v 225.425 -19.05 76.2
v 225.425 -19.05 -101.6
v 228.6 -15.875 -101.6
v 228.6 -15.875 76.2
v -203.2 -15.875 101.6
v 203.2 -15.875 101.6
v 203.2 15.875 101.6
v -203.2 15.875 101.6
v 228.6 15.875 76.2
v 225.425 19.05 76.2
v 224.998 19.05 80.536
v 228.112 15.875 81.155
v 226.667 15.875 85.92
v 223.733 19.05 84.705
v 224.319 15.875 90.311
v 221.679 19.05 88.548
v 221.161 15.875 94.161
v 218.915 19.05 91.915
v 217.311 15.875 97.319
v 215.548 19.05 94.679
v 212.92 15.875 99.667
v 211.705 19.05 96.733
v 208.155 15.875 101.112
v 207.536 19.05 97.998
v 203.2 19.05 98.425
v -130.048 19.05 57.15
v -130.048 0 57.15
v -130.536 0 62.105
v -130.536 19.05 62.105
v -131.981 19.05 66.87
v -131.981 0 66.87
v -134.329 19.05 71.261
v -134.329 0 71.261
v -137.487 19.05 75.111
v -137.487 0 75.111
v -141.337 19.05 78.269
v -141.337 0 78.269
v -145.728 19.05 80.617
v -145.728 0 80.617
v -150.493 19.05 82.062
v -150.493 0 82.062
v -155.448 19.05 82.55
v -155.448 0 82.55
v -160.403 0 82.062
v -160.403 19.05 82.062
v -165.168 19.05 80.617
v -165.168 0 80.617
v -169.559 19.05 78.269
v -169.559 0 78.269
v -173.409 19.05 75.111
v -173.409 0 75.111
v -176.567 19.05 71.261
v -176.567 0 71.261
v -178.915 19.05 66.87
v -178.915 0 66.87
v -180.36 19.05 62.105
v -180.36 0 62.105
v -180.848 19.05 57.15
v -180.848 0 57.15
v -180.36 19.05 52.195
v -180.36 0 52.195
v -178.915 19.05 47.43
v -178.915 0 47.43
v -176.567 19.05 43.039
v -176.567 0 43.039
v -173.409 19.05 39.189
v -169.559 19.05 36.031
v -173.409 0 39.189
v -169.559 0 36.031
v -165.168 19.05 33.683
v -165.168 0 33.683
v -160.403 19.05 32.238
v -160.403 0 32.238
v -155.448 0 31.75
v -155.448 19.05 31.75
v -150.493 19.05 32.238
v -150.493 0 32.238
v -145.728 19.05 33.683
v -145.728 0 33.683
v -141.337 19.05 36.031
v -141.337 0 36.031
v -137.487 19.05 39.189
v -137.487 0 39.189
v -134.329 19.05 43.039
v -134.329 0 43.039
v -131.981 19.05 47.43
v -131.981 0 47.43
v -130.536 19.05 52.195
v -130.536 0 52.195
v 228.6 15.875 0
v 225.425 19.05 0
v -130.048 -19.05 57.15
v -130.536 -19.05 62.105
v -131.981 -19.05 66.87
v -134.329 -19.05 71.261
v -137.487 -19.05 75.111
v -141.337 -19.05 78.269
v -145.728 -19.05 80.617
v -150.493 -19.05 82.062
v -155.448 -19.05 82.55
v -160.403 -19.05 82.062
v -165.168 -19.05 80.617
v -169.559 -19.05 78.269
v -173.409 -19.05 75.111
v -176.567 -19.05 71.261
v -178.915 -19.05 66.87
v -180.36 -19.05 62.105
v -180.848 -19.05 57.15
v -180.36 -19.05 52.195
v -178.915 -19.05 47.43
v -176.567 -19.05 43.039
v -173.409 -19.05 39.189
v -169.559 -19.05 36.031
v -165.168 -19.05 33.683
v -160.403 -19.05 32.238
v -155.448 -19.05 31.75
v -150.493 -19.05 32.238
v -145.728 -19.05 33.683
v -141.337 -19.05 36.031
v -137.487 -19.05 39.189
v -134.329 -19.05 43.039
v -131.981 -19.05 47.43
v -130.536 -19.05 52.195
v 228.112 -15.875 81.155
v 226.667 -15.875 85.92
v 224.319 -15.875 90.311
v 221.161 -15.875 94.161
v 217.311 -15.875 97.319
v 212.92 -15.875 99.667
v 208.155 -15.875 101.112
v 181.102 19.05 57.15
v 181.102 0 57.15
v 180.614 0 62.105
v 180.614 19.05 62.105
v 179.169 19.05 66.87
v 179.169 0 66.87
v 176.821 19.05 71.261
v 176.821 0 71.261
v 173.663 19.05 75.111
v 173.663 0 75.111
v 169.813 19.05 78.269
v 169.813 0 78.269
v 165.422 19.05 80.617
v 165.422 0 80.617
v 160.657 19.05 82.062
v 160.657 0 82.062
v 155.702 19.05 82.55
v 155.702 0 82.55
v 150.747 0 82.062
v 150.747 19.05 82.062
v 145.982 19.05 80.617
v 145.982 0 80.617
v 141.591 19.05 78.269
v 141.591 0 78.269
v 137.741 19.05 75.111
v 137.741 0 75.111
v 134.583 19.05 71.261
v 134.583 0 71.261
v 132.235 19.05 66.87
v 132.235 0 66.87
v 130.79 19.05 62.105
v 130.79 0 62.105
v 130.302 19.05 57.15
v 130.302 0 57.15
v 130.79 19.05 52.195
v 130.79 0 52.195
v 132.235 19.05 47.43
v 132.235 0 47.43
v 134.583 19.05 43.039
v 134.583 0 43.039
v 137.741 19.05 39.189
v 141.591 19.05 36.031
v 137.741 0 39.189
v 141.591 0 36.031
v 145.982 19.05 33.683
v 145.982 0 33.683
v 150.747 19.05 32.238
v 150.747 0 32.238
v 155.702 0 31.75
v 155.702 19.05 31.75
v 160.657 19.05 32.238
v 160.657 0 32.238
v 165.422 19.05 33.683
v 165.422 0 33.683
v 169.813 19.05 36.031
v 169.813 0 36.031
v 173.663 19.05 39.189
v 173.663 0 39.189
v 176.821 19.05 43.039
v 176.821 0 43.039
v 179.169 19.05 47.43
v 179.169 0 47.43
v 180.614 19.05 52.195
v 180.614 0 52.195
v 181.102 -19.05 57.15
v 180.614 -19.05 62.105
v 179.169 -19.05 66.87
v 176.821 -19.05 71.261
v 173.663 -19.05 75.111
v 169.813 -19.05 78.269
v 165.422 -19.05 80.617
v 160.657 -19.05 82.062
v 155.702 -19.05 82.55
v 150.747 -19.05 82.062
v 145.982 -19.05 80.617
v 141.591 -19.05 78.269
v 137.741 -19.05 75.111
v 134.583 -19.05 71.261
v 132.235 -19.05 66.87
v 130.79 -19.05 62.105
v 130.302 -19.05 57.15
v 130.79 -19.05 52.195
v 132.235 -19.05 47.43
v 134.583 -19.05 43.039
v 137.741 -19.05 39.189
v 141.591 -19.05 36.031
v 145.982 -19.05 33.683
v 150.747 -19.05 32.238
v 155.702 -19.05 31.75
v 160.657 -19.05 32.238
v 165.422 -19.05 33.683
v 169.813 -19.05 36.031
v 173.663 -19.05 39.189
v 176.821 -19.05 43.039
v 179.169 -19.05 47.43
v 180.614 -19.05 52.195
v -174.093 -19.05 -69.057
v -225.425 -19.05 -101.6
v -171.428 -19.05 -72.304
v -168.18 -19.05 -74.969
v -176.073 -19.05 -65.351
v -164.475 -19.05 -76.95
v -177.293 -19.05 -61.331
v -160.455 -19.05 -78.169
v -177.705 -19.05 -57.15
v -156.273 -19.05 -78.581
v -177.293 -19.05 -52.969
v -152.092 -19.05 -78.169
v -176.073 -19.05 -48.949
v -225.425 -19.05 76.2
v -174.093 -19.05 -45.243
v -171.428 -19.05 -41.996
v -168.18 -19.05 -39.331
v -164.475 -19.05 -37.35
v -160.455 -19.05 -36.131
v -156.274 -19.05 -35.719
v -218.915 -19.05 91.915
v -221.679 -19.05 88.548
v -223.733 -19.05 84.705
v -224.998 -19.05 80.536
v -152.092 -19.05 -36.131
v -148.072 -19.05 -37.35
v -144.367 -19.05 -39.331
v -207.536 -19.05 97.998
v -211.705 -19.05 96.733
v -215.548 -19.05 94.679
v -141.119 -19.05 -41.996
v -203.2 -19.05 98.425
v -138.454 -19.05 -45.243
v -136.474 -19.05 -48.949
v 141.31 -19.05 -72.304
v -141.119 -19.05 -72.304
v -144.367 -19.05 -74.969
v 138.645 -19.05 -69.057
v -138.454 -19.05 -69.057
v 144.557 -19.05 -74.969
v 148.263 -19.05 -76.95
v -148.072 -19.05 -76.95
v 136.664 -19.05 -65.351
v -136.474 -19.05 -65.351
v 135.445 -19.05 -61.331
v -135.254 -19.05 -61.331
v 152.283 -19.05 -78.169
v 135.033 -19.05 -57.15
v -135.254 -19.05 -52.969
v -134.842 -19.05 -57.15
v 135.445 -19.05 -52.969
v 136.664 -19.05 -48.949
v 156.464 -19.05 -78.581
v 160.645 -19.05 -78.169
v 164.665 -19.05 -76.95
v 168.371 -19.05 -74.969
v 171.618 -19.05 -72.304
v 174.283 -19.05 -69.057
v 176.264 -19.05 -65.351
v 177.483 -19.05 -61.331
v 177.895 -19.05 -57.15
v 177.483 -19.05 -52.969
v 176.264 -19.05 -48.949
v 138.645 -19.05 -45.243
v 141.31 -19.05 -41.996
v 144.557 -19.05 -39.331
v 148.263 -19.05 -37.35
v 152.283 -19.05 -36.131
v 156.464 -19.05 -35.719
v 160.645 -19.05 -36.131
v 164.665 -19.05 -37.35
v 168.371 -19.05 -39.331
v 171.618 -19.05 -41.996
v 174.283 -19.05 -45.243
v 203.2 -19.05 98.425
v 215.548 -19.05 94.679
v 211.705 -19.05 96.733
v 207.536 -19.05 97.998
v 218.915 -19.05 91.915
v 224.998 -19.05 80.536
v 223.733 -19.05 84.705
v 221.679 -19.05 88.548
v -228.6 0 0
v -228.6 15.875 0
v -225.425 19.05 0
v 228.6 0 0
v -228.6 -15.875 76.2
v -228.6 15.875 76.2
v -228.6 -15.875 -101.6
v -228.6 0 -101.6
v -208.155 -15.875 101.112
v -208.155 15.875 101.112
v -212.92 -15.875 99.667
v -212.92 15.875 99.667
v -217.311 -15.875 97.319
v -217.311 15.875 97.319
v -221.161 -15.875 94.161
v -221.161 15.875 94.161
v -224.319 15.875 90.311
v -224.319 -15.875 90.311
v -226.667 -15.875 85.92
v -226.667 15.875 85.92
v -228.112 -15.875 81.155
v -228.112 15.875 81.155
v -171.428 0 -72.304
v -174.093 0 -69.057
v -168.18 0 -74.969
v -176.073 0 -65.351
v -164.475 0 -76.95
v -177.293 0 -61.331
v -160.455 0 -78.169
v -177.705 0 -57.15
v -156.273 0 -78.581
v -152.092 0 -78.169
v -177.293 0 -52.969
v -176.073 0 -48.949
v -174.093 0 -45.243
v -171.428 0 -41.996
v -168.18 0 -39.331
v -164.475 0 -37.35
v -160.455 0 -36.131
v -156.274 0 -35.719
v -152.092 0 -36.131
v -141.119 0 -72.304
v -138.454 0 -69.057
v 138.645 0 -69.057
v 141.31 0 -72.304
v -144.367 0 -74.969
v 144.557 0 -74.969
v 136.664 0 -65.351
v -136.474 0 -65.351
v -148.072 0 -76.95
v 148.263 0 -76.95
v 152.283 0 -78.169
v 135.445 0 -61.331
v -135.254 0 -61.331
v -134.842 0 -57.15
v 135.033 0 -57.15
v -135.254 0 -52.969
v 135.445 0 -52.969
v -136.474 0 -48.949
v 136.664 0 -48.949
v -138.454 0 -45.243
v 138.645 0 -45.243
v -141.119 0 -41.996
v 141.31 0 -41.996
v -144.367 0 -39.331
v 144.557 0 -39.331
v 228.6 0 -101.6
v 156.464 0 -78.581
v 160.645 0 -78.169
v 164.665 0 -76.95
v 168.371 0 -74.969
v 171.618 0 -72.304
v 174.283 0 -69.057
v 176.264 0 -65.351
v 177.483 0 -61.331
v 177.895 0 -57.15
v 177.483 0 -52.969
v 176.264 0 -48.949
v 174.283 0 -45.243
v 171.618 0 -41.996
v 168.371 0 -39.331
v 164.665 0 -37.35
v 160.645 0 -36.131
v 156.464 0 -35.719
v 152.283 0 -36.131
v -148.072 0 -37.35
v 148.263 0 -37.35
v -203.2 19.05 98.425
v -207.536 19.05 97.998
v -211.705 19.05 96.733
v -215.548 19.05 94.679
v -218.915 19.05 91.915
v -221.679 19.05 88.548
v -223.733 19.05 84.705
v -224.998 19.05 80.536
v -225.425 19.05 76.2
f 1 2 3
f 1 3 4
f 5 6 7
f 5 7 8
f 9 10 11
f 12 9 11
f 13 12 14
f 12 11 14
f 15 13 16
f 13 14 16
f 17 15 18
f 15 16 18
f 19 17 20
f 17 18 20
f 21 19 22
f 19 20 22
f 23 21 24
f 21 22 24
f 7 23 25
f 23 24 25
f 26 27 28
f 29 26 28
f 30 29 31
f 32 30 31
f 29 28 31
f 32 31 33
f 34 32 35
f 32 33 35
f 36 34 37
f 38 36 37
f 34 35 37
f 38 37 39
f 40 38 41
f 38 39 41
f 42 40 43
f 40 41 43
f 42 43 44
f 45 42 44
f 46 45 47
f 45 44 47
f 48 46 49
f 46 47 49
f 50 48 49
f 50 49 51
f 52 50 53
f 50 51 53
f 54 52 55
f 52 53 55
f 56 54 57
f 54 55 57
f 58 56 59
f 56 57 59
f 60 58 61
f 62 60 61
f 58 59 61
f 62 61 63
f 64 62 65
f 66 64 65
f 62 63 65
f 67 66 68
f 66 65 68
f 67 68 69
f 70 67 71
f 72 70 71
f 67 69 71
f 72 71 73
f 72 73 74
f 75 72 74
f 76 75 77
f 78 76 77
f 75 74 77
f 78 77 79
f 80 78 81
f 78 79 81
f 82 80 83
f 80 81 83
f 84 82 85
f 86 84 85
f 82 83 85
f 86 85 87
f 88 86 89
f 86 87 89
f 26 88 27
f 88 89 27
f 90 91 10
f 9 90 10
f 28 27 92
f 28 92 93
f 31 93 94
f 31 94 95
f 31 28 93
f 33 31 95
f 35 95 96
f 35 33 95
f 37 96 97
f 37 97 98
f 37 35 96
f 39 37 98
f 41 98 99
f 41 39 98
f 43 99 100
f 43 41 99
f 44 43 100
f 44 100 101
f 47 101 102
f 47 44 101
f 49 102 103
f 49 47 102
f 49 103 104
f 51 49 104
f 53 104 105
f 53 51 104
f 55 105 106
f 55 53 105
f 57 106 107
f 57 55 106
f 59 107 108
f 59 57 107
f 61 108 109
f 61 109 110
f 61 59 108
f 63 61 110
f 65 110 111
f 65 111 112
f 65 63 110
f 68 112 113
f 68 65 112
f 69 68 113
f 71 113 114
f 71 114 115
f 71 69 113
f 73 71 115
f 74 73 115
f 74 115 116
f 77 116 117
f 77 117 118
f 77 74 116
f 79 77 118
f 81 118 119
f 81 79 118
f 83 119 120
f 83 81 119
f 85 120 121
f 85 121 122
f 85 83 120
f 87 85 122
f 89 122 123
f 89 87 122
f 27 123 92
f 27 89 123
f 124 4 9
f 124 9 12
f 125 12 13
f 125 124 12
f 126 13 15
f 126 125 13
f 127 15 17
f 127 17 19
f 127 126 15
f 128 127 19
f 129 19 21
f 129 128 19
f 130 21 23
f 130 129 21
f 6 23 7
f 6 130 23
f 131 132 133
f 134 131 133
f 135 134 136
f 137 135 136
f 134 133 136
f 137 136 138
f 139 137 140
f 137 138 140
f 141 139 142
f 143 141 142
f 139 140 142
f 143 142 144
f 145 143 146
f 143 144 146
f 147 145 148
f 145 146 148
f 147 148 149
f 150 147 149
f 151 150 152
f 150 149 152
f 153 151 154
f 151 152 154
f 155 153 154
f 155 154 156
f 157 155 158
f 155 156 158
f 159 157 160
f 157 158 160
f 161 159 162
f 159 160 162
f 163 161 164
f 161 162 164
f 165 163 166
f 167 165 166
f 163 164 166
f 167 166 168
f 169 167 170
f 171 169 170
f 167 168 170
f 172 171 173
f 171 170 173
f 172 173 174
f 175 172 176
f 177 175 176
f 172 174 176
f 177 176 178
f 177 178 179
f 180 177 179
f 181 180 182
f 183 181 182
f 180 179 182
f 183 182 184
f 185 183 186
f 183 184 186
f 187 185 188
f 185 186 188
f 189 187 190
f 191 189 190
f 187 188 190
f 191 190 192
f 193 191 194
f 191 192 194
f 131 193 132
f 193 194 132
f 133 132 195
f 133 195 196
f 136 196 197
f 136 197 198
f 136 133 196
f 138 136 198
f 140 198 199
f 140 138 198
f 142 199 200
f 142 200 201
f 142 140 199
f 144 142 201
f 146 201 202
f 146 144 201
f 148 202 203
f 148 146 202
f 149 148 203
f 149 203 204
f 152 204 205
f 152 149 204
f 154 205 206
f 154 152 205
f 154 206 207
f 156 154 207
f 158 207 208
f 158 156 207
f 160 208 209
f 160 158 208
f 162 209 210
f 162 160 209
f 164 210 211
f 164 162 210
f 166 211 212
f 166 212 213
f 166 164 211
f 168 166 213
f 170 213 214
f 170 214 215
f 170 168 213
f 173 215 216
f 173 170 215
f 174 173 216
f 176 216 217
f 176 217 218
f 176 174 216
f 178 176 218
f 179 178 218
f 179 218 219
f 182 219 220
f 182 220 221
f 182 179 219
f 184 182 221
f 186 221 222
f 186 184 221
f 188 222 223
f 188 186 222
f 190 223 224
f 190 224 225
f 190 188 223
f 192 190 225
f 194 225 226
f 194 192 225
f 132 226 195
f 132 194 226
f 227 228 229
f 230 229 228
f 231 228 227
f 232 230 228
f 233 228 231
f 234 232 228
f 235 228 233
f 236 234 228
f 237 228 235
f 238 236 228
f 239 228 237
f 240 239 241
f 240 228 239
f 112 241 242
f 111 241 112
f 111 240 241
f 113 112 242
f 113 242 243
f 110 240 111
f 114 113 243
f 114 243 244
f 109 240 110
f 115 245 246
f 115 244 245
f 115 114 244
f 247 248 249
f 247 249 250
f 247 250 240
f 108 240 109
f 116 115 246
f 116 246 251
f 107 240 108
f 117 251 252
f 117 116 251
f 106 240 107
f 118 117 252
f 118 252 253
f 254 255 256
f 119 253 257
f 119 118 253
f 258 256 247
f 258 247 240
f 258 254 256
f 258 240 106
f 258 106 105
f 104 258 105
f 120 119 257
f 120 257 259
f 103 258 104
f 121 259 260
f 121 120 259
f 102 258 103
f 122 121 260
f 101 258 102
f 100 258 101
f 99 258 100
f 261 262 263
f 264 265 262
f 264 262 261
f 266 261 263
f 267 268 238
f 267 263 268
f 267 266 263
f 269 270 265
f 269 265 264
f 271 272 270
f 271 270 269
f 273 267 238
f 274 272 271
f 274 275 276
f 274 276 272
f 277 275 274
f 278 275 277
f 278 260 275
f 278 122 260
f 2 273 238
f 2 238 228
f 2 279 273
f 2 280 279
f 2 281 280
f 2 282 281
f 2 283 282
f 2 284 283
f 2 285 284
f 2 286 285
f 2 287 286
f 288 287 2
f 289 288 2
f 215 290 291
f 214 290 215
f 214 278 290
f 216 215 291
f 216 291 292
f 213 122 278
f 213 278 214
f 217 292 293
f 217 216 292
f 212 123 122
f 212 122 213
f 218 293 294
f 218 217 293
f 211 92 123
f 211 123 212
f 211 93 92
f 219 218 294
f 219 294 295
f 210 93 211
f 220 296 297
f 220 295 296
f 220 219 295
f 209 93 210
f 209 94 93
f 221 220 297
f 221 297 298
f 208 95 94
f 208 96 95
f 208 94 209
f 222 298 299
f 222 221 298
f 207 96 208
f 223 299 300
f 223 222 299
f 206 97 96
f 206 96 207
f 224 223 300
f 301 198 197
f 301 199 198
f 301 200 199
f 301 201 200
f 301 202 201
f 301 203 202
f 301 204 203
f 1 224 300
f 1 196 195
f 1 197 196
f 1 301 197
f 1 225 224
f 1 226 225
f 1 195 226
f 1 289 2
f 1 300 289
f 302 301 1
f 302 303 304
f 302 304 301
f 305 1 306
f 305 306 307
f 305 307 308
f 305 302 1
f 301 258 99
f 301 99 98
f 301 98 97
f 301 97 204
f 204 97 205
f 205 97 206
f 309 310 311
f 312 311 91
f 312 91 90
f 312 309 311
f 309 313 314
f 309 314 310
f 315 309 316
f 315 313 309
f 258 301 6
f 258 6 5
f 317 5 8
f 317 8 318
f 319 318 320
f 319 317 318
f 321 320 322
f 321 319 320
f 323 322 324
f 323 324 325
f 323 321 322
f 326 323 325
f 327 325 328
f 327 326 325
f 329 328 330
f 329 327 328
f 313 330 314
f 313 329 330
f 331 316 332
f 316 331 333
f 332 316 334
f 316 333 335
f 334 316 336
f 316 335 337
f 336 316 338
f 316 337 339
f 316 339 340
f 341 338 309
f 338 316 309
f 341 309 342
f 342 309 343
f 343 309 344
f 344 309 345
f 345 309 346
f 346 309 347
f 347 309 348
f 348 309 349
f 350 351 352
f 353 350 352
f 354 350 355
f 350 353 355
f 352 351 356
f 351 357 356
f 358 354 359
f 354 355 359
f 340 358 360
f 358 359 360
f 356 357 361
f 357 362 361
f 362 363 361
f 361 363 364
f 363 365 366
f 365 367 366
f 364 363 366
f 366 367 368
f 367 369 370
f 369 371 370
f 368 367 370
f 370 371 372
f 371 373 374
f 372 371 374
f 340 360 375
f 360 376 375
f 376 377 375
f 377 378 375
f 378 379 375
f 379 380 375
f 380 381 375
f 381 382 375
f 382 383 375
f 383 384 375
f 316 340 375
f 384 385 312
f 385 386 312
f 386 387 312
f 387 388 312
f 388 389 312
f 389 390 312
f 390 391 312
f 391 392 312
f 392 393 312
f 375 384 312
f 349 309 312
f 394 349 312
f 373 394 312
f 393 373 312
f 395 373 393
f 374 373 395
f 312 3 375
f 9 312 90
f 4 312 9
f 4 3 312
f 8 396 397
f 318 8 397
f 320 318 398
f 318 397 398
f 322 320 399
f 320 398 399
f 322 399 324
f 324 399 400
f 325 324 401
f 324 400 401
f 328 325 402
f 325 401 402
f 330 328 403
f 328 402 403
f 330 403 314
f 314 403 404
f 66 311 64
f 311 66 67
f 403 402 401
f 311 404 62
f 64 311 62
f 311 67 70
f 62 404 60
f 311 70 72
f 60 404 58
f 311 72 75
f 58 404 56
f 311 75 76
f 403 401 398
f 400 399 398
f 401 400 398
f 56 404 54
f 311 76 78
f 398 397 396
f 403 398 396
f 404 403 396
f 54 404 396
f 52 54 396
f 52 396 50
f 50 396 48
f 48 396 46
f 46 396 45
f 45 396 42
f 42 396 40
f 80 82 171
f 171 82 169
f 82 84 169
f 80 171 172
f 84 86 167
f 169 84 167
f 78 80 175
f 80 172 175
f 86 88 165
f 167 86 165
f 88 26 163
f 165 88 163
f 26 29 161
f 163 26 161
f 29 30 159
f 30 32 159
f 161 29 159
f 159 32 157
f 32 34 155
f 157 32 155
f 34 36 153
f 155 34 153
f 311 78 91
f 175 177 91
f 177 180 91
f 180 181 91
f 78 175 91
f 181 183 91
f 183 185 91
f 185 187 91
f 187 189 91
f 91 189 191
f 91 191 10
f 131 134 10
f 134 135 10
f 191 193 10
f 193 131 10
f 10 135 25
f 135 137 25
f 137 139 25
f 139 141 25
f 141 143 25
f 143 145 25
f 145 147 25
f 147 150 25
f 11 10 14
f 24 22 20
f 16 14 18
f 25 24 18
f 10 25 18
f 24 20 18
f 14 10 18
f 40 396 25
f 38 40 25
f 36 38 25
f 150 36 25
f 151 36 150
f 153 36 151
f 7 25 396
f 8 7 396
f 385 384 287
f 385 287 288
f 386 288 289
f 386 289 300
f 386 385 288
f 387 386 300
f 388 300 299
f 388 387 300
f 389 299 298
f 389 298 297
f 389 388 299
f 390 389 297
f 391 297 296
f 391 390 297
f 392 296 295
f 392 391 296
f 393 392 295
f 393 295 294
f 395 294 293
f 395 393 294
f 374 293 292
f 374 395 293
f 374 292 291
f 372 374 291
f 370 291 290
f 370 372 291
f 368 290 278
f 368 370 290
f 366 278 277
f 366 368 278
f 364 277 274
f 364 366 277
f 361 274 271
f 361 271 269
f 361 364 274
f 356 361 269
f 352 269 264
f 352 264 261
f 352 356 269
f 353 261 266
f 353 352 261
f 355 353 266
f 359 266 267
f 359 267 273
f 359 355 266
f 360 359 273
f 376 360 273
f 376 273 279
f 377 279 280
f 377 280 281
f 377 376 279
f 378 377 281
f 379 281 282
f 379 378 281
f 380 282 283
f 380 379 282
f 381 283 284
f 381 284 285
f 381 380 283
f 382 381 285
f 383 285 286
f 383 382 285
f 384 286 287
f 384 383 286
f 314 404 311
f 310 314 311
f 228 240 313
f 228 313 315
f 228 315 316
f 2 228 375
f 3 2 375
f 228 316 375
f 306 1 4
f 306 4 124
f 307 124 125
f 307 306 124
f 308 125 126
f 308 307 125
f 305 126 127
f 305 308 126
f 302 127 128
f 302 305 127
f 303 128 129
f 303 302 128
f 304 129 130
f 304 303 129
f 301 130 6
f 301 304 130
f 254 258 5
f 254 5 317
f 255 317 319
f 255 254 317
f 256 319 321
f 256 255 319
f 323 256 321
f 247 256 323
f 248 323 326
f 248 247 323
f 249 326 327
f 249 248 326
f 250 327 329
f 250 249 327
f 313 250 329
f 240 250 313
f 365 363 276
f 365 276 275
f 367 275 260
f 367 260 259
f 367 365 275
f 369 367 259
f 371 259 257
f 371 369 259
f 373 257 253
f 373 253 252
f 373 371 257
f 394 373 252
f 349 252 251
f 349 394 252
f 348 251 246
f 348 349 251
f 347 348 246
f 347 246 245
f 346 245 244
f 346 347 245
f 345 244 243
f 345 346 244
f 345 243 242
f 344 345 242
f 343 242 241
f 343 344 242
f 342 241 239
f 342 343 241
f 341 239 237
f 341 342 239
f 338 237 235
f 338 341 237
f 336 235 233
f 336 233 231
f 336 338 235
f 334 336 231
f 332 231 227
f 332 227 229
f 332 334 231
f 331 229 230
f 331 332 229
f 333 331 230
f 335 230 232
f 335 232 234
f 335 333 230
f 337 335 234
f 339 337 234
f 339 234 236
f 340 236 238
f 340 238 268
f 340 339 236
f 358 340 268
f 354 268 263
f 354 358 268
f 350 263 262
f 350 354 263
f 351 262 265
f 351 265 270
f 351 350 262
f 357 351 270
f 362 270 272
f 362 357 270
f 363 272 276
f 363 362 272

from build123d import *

# Parameters (mm, degrees)
F0_R     = 25.4
F0_W     = 457.2
F0_H     = 101.6
F0_R_2   = 21.43125
F1_DEPTH = 19.05
F2_DEPTH = 19.05
F3_SIZE  = 3.175


with BuildPart() as f1:
    # F0 (on Front) → F1 (new body)
    with BuildSketch(Plane.XZ):
        with BuildLine():
            ThreePointArc((228.6, 76.2), (221.160512, 94.160512), (203.2, 101.6))
            Line((203.2, 101.6), (-203.2, 101.6))
            ThreePointArc((-203.2, 101.6), (-221.160512, 94.160512), (-228.6, 76.2))
            Line((-228.6, 76.2), (-228.6, 0))
            Line((-228.6, 0), (228.6, 0))
            Line((228.6, 0), (228.6, 76.2))
        make_face()
        with Locations((-155.448, 57.15)):
            Circle(F0_R, mode=Mode.SUBTRACT)
        with Locations((155.702, 57.15)):
            Circle(F0_R, mode=Mode.SUBTRACT)
        with Locations((0, -50.8)):
            Rectangle(F0_W, F0_H)
        with Locations((-156.2735, -57.15)):
            Circle(F0_R_2, mode=Mode.SUBTRACT)
        with Locations((156.464, -57.15)):
            Circle(F0_R_2, mode=Mode.SUBTRACT)
    extrude(amount=F1_DEPTH)

    # F0 (on Front) → F2 (join)
    with BuildSketch(Plane.XZ):
        with BuildLine():
            ThreePointArc((228.6, 76.2), (221.160512, 94.160512), (203.2, 101.6))
            Line((203.2, 101.6), (-203.2, 101.6))
            ThreePointArc((-203.2, 101.6), (-221.160512, 94.160512), (-228.6, 76.2))
            Line((-228.6, 76.2), (-228.6, 0))
            Line((-228.6, 0), (228.6, 0))
            Line((228.6, 0), (228.6, 76.2))
        make_face()
        with Locations((-155.448, 57.15)):
            Circle(F0_R, mode=Mode.SUBTRACT)
        with Locations((155.702, 57.15)):
            Circle(F0_R, mode=Mode.SUBTRACT)
    extrude(amount=-F2_DEPTH)

    # F3
    f3_edges = [f1.edges().sort_by_distance(p)[0] for p in [
        (-203.2, 0, 101.6),
        (-228.6, -19.05, -12.7),
        (-228.6, 19.05, 38.1),
    ]]
    chamfer(f3_edges, length=F3_SIZE)


solid = f1.part
